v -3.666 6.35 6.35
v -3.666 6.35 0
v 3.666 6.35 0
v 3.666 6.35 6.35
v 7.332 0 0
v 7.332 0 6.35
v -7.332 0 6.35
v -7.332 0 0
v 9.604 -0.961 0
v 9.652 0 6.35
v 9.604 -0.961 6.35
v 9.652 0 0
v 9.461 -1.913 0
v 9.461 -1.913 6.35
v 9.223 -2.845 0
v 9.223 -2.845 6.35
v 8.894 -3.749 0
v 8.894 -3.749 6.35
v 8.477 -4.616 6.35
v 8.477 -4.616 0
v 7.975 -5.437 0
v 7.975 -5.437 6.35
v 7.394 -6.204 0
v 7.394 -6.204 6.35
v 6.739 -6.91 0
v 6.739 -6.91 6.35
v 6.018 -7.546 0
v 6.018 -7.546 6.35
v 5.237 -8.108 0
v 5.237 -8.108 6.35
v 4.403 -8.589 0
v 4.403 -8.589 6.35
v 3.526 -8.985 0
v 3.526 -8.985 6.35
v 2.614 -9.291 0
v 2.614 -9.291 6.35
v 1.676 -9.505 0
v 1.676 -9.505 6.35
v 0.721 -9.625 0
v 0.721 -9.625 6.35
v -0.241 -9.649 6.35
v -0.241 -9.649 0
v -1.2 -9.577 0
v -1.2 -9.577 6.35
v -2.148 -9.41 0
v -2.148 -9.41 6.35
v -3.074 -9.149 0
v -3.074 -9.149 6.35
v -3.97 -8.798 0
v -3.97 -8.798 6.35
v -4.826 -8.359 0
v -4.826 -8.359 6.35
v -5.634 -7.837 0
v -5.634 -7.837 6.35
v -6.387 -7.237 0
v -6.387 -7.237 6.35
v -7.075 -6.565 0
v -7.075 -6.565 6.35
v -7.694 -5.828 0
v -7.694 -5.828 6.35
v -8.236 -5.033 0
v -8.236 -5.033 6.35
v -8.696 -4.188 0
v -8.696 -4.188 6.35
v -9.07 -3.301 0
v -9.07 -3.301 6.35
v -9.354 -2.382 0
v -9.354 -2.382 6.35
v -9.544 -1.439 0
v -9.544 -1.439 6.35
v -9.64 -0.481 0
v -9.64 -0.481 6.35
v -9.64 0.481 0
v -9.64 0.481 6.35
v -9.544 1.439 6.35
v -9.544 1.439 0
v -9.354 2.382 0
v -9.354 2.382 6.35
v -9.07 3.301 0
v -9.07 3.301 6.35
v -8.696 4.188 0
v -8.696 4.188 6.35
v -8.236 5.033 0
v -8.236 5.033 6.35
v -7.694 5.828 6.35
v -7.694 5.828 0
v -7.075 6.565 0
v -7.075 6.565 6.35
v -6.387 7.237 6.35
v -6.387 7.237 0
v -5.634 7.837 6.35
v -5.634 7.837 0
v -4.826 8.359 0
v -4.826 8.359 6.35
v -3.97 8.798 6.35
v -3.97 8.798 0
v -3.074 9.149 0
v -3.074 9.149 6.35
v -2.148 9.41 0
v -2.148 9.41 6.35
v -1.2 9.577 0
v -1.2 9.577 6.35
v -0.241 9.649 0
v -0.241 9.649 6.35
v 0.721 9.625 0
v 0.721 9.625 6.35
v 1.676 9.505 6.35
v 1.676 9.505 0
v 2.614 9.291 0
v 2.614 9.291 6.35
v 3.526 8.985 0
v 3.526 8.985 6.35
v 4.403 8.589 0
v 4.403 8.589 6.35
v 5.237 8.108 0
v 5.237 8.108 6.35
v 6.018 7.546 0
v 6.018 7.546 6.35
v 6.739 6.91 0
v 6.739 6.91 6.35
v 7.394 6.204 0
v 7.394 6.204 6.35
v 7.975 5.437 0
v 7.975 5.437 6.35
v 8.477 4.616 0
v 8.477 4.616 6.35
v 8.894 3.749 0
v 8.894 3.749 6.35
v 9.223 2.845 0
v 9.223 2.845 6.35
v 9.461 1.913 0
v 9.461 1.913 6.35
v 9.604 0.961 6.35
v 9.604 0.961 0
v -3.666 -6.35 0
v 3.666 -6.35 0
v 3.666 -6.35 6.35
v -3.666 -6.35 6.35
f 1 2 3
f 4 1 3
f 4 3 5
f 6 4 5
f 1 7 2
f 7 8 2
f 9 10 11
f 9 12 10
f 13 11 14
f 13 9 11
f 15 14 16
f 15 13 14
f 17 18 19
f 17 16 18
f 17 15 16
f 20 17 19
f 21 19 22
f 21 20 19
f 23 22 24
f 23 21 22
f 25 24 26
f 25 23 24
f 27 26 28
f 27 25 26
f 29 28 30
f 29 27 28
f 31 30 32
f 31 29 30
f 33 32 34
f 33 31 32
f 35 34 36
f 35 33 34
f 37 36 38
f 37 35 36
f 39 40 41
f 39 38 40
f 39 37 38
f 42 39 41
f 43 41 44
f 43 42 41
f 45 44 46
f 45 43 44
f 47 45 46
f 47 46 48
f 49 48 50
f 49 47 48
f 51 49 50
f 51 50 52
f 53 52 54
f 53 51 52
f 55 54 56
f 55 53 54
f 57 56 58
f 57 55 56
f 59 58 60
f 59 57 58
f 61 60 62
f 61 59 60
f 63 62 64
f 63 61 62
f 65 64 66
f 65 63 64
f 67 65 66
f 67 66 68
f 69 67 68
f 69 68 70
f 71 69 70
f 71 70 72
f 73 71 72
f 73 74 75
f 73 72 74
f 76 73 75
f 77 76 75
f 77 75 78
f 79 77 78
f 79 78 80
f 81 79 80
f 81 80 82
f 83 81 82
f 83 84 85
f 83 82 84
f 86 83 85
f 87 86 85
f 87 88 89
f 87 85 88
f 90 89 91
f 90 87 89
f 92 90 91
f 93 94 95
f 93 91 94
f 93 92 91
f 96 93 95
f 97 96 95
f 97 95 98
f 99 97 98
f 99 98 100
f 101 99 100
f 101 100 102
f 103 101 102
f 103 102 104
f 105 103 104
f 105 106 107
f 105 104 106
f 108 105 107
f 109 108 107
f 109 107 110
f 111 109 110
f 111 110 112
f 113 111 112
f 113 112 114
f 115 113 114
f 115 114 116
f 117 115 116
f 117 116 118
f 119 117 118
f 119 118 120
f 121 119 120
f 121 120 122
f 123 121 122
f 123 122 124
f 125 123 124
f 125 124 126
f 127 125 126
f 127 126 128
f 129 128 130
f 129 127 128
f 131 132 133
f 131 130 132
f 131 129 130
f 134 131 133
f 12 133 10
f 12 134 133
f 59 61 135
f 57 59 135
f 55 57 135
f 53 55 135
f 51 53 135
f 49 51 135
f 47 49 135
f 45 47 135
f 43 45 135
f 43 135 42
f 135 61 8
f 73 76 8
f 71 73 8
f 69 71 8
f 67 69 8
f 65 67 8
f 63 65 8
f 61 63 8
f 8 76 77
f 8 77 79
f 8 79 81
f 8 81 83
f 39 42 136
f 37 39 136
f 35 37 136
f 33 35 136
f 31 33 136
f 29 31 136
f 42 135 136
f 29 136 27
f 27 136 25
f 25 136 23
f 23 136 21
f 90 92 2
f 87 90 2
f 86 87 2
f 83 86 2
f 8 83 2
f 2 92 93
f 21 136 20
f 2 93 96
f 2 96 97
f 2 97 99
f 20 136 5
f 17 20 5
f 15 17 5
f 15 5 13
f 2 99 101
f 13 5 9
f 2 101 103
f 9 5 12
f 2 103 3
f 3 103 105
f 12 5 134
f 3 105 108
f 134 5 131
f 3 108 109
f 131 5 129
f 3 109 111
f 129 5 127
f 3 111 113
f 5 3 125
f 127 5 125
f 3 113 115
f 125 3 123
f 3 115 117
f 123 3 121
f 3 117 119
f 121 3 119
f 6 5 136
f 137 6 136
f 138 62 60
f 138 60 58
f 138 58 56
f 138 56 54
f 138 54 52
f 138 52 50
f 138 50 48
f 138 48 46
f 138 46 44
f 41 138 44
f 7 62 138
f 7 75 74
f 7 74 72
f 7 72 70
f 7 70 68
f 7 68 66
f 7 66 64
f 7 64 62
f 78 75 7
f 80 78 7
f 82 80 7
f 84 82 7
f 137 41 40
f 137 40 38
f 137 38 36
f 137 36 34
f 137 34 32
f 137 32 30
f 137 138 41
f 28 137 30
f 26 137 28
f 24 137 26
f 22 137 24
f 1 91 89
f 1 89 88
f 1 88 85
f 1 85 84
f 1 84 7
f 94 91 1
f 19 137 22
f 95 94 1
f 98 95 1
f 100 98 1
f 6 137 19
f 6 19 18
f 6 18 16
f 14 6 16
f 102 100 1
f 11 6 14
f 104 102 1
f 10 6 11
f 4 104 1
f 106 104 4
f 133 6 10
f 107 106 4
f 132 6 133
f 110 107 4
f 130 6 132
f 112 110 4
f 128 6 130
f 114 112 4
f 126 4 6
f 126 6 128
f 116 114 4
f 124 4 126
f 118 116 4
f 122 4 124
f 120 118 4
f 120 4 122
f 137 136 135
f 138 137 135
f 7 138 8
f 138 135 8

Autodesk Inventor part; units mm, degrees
ref_plane "YZ Plane" through (0, 0, 0) normal (1, 0, 0) x (0, 1, 0)
ref_plane "XZ Plane" through (0, 0, 0) normal (0, 1, 0) x (-1, 0, 0)
ref_plane "XY Plane" through (0, 0, 0) normal (0, 0, 1) x (1, 0, 0)
sketch "Sketch1" plane through (0, 0, 0) normal (0, 0, 1) x (1, 0, 0)
  line L0 (7.3323, 0) -> (3.6662, -6.35)
  line L1 (3.6662, -6.35) -> (-3.6662, -6.35)
  line L2 (-3.6662, -6.35) -> (-7.3323, 0)
  line L3 (-7.3323, 0) -> (-3.6662, 6.35)
  line L4 (-3.6662, 6.35) -> (3.6662, 6.35)
  line L5 (3.6662, 6.35) -> (7.3323, 0)
  circle A0 centre (0, 0) radius 9.652
  point P0 (0, 0)
  point P1 (0, 0)
  dimension "d0" = 19.304
  dimension "d1" = 12.7
extrude "Extrusion1" add sketch "Sketch1" along normal blind 6.35
properties part number "0.25 Spacer"
